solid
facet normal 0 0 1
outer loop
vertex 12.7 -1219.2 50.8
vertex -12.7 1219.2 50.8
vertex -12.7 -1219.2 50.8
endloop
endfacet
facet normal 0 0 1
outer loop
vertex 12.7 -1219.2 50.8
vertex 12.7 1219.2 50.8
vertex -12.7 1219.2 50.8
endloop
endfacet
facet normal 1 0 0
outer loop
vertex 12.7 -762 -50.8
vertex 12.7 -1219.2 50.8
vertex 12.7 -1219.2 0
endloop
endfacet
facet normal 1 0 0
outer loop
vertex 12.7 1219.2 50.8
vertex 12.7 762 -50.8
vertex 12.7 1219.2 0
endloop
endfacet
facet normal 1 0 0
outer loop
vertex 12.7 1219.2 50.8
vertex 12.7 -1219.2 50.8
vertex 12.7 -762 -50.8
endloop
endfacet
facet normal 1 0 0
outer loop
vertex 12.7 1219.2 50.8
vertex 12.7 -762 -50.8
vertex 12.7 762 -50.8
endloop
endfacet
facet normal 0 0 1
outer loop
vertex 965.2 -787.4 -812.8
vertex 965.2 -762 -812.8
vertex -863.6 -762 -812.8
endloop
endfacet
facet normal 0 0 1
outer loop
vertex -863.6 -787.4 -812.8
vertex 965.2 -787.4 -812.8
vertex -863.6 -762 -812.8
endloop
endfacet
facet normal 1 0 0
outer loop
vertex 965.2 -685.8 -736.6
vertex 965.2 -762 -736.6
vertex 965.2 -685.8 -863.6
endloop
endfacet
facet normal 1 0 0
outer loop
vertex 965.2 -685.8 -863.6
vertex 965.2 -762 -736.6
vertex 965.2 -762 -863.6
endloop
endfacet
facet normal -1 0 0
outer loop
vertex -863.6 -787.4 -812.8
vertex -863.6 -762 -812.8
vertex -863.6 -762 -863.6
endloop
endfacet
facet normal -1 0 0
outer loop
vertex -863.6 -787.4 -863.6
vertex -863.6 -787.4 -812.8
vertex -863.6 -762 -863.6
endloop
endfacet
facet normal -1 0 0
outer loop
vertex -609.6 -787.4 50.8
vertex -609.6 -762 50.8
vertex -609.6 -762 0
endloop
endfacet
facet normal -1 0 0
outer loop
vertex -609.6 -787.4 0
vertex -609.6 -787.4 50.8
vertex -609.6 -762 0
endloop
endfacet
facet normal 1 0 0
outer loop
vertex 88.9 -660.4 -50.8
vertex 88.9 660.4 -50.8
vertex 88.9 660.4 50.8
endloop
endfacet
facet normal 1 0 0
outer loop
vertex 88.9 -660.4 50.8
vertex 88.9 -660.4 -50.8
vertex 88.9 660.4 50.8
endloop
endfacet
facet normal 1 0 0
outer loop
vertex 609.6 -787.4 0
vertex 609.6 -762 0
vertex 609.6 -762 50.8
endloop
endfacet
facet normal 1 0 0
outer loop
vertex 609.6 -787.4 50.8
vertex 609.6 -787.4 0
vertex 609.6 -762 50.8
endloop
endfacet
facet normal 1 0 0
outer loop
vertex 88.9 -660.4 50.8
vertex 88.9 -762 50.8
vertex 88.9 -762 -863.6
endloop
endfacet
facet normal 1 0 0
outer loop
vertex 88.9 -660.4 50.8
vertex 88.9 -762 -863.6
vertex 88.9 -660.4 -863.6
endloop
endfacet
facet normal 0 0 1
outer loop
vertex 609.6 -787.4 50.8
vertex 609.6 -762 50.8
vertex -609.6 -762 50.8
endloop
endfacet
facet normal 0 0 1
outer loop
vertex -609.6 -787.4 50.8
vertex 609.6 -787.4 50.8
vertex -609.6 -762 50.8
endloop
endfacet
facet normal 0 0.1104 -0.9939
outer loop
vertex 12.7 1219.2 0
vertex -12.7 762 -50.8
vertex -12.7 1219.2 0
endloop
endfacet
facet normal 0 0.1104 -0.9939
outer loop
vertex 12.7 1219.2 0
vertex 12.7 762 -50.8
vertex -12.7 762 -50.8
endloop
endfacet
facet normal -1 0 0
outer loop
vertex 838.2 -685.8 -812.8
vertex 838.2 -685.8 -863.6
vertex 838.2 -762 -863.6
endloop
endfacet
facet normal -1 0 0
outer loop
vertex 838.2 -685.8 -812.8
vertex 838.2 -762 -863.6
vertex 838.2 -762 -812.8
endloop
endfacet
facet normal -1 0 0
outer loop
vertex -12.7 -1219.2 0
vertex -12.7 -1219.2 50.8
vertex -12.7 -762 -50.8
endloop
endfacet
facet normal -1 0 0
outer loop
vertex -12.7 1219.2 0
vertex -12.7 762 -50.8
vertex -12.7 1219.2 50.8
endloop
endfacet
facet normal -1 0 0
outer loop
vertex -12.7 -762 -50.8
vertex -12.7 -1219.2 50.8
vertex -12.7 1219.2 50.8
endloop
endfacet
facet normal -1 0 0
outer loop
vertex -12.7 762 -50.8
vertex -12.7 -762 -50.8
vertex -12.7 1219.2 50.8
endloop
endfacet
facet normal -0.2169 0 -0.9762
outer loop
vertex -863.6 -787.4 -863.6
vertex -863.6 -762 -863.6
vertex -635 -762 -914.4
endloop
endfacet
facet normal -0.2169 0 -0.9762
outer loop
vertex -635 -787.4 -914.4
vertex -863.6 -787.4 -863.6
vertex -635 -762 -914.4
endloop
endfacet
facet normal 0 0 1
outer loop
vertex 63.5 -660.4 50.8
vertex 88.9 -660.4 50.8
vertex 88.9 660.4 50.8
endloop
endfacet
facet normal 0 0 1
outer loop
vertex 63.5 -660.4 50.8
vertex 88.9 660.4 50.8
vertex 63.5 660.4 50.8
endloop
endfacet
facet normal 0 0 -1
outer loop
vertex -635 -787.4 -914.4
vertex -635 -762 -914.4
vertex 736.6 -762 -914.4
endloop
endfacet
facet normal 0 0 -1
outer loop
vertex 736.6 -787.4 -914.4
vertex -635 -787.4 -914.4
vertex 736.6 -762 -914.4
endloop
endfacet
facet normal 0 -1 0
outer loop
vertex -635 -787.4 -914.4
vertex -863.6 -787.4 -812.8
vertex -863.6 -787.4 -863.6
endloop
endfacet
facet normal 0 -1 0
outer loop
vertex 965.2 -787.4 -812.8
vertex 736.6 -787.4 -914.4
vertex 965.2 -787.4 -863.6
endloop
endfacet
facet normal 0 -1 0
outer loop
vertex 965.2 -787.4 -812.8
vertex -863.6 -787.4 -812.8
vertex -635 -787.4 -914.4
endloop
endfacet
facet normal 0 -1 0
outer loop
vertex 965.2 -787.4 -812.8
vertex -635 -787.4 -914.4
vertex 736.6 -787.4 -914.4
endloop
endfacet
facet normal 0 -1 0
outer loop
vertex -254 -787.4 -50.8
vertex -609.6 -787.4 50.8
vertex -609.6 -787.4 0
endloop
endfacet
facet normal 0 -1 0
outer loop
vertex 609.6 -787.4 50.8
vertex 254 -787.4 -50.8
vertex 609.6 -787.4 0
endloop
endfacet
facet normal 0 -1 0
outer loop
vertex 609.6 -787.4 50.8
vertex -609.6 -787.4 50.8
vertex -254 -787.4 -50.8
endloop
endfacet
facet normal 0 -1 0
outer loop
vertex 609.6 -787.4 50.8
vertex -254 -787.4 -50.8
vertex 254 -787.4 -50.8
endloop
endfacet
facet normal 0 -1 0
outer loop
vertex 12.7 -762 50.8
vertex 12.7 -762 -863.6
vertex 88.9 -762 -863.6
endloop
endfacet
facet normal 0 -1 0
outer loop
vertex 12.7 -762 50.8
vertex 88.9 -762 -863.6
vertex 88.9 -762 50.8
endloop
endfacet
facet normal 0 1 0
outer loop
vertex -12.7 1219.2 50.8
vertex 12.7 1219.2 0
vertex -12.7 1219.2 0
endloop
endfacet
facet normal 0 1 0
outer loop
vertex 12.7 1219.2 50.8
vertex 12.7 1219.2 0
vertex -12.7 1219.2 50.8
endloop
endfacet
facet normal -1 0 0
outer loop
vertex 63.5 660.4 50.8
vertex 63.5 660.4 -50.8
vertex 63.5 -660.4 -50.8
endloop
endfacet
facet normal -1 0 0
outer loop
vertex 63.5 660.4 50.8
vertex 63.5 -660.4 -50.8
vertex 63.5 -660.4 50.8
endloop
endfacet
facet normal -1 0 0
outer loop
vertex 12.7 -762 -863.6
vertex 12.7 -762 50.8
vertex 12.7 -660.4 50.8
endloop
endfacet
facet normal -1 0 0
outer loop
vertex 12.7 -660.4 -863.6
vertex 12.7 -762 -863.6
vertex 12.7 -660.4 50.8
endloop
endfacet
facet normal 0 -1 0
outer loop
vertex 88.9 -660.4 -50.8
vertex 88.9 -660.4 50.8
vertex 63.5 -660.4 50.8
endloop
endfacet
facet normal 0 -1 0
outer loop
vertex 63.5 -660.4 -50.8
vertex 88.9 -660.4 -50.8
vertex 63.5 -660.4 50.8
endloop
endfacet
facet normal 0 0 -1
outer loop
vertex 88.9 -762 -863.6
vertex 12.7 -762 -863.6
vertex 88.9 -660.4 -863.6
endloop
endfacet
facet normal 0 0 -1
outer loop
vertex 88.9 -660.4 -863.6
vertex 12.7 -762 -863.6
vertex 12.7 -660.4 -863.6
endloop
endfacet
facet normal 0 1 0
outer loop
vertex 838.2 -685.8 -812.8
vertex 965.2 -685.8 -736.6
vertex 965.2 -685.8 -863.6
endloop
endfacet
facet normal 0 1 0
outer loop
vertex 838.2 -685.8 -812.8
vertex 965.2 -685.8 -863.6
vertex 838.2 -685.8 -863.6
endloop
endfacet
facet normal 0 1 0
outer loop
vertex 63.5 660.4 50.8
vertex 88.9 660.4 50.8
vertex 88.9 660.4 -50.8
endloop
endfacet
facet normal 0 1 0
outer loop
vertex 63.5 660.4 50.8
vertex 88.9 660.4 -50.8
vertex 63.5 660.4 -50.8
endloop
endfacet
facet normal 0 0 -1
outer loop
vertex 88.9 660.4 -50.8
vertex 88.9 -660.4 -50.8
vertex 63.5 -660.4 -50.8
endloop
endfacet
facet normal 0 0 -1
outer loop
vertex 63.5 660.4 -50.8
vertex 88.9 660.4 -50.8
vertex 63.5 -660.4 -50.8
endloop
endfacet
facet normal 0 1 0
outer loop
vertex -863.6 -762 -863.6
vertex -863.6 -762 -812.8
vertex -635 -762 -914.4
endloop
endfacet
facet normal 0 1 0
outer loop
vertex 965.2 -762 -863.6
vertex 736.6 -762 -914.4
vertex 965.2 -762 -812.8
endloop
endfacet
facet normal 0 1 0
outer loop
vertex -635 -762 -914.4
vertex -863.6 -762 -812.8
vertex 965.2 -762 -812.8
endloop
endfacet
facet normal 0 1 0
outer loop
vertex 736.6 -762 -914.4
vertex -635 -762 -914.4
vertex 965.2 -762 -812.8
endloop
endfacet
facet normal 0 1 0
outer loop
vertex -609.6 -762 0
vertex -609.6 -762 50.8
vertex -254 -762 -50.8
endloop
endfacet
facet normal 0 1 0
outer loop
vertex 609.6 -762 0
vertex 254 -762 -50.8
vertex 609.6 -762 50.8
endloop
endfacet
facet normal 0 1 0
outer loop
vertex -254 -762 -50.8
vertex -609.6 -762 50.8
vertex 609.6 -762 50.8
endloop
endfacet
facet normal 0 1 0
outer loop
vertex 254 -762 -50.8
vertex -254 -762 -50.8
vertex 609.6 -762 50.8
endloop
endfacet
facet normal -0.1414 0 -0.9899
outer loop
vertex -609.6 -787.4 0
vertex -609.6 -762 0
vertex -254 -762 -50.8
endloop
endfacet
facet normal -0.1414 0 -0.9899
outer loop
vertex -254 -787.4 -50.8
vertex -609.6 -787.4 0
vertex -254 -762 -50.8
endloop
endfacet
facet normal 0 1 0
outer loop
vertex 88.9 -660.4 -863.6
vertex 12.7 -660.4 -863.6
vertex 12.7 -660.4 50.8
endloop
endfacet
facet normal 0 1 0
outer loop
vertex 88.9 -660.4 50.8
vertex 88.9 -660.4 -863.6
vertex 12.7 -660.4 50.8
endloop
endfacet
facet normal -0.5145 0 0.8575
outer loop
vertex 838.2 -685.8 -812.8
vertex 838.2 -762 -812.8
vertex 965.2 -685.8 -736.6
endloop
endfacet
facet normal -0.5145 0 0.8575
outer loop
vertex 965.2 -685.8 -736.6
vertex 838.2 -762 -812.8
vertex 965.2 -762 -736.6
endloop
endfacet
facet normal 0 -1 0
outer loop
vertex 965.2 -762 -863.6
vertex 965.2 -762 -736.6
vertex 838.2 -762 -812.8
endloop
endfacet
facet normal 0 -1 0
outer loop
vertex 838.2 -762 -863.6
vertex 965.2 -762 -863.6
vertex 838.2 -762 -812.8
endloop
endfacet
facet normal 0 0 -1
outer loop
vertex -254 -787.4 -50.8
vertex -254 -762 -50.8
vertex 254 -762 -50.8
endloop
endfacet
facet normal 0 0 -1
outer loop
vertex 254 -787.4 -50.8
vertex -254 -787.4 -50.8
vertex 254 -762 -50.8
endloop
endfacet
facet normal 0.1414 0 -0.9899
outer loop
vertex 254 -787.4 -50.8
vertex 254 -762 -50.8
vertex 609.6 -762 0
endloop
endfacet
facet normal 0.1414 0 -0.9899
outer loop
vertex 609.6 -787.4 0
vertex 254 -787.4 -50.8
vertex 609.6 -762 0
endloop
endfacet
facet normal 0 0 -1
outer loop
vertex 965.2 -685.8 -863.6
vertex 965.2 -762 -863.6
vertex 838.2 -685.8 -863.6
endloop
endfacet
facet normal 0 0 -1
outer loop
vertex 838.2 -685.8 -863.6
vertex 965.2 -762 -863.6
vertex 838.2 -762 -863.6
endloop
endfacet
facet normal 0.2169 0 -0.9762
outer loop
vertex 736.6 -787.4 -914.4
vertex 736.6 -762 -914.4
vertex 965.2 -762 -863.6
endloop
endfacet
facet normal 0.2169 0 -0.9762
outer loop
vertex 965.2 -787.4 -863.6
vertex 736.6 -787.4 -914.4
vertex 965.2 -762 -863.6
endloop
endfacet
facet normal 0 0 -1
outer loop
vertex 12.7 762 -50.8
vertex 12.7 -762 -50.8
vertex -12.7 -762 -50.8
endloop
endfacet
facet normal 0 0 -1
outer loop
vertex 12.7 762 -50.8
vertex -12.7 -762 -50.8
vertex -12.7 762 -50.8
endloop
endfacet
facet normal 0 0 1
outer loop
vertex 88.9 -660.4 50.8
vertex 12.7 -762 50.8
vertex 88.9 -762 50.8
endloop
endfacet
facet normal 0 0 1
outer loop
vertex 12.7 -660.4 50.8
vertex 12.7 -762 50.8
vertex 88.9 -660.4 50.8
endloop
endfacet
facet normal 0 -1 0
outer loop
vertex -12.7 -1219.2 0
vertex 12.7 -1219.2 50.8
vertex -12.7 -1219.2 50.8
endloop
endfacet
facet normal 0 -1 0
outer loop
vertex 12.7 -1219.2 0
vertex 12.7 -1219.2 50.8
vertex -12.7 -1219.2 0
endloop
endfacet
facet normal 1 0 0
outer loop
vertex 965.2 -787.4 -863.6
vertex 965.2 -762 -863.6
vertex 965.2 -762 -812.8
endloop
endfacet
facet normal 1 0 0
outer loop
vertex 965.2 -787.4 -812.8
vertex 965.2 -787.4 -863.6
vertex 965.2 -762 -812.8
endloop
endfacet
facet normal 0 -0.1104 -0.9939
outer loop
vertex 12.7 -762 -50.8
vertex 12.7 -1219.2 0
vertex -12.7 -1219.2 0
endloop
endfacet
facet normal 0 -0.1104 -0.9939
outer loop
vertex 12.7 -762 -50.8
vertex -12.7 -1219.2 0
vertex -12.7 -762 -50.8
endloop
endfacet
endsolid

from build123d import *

# Parameters (mm, degrees)
F1_DEPTH  = 12.7
F2_W      = 101.6
F2_H      = 914.4
F3_DEPTH  = 76.2
F6_DEPTH  = 25.4
F9_DEPTH  = 25.4
F10_W     = 25.4
F10_H     = 101.6
F11_DEPTH = 1320.8
F13_DEPTH = 76.2


with BuildPart() as f1:
    # F0 (on Right) → F1 (new body, symmetric)
    with BuildSketch(Plane.YZ):
        Polygon((1219.2, 50.8), (-1219.2, 50.8), (-1219.2, 0), (-762, -50.8), (762, -50.8), (762.490941, -50.745451), (1219.2, 0), align=None)
    extrude(amount=F1_DEPTH, both=True)


with BuildPart() as f3:
    # F2 (on face) → F3 (new body)
    with BuildSketch(Plane.YZ.offset(12.7)):
        with Locations((-711.2, -406.4)):
            Rectangle(F2_W, F2_H)
    extrude(amount=F3_DEPTH)


with BuildPart() as f4_1:
    # F4: copy of F3
    add(f3.part.moved(Location((0, 1422.4, 0))))


with BuildPart() as f6:
    # F5 (on face) → F6 (new body)
    with BuildSketch(Plane.XZ.offset(762)):
        Polygon((609.6, 50.8), (-609.6, 50.8), (-609.6, 0), (-254, -50.8), (254, -50.8), (609.6, 0), align=None)
    extrude(amount=F6_DEPTH)


with BuildPart() as f9:
    # F8 (on face) → F9 (new body)
    with BuildSketch(Plane.XZ.offset(762)):
        Polygon((965.2, -812.8), (-863.6, -812.8), (-863.6, -863.6), (-635, -914.4), (736.6, -914.4), (965.2, -863.6), align=None)
    extrude(amount=F9_DEPTH)


with BuildPart() as f11:
    # F10 (on face) → F11 (new body)
    with BuildSketch(Plane(origin=(0, -660.4, 0), x_dir=(-1, 0, 0), z_dir=(0, 1, 0))):
        with Locations((-76.2, 0)):
            Rectangle(F10_W, F10_H)
    extrude(amount=F11_DEPTH)


with BuildPart() as f13:
    # F12 (on face) → F13 (new body)
    with BuildSketch(Plane(origin=(0, -762, 0), x_dir=(-1, 0, 0), z_dir=(0, 1, 0))):
        Polygon((-965.2, -736.6), (-965.2, -812.8), (-965.2, -863.6), (-838.2, -863.6), (-838.2, -812.8), align=None)
    extrude(amount=F13_DEPTH)


solid = Compound([f1.part, f3.part, f6.part, f9.part, f11.part, f13.part])
